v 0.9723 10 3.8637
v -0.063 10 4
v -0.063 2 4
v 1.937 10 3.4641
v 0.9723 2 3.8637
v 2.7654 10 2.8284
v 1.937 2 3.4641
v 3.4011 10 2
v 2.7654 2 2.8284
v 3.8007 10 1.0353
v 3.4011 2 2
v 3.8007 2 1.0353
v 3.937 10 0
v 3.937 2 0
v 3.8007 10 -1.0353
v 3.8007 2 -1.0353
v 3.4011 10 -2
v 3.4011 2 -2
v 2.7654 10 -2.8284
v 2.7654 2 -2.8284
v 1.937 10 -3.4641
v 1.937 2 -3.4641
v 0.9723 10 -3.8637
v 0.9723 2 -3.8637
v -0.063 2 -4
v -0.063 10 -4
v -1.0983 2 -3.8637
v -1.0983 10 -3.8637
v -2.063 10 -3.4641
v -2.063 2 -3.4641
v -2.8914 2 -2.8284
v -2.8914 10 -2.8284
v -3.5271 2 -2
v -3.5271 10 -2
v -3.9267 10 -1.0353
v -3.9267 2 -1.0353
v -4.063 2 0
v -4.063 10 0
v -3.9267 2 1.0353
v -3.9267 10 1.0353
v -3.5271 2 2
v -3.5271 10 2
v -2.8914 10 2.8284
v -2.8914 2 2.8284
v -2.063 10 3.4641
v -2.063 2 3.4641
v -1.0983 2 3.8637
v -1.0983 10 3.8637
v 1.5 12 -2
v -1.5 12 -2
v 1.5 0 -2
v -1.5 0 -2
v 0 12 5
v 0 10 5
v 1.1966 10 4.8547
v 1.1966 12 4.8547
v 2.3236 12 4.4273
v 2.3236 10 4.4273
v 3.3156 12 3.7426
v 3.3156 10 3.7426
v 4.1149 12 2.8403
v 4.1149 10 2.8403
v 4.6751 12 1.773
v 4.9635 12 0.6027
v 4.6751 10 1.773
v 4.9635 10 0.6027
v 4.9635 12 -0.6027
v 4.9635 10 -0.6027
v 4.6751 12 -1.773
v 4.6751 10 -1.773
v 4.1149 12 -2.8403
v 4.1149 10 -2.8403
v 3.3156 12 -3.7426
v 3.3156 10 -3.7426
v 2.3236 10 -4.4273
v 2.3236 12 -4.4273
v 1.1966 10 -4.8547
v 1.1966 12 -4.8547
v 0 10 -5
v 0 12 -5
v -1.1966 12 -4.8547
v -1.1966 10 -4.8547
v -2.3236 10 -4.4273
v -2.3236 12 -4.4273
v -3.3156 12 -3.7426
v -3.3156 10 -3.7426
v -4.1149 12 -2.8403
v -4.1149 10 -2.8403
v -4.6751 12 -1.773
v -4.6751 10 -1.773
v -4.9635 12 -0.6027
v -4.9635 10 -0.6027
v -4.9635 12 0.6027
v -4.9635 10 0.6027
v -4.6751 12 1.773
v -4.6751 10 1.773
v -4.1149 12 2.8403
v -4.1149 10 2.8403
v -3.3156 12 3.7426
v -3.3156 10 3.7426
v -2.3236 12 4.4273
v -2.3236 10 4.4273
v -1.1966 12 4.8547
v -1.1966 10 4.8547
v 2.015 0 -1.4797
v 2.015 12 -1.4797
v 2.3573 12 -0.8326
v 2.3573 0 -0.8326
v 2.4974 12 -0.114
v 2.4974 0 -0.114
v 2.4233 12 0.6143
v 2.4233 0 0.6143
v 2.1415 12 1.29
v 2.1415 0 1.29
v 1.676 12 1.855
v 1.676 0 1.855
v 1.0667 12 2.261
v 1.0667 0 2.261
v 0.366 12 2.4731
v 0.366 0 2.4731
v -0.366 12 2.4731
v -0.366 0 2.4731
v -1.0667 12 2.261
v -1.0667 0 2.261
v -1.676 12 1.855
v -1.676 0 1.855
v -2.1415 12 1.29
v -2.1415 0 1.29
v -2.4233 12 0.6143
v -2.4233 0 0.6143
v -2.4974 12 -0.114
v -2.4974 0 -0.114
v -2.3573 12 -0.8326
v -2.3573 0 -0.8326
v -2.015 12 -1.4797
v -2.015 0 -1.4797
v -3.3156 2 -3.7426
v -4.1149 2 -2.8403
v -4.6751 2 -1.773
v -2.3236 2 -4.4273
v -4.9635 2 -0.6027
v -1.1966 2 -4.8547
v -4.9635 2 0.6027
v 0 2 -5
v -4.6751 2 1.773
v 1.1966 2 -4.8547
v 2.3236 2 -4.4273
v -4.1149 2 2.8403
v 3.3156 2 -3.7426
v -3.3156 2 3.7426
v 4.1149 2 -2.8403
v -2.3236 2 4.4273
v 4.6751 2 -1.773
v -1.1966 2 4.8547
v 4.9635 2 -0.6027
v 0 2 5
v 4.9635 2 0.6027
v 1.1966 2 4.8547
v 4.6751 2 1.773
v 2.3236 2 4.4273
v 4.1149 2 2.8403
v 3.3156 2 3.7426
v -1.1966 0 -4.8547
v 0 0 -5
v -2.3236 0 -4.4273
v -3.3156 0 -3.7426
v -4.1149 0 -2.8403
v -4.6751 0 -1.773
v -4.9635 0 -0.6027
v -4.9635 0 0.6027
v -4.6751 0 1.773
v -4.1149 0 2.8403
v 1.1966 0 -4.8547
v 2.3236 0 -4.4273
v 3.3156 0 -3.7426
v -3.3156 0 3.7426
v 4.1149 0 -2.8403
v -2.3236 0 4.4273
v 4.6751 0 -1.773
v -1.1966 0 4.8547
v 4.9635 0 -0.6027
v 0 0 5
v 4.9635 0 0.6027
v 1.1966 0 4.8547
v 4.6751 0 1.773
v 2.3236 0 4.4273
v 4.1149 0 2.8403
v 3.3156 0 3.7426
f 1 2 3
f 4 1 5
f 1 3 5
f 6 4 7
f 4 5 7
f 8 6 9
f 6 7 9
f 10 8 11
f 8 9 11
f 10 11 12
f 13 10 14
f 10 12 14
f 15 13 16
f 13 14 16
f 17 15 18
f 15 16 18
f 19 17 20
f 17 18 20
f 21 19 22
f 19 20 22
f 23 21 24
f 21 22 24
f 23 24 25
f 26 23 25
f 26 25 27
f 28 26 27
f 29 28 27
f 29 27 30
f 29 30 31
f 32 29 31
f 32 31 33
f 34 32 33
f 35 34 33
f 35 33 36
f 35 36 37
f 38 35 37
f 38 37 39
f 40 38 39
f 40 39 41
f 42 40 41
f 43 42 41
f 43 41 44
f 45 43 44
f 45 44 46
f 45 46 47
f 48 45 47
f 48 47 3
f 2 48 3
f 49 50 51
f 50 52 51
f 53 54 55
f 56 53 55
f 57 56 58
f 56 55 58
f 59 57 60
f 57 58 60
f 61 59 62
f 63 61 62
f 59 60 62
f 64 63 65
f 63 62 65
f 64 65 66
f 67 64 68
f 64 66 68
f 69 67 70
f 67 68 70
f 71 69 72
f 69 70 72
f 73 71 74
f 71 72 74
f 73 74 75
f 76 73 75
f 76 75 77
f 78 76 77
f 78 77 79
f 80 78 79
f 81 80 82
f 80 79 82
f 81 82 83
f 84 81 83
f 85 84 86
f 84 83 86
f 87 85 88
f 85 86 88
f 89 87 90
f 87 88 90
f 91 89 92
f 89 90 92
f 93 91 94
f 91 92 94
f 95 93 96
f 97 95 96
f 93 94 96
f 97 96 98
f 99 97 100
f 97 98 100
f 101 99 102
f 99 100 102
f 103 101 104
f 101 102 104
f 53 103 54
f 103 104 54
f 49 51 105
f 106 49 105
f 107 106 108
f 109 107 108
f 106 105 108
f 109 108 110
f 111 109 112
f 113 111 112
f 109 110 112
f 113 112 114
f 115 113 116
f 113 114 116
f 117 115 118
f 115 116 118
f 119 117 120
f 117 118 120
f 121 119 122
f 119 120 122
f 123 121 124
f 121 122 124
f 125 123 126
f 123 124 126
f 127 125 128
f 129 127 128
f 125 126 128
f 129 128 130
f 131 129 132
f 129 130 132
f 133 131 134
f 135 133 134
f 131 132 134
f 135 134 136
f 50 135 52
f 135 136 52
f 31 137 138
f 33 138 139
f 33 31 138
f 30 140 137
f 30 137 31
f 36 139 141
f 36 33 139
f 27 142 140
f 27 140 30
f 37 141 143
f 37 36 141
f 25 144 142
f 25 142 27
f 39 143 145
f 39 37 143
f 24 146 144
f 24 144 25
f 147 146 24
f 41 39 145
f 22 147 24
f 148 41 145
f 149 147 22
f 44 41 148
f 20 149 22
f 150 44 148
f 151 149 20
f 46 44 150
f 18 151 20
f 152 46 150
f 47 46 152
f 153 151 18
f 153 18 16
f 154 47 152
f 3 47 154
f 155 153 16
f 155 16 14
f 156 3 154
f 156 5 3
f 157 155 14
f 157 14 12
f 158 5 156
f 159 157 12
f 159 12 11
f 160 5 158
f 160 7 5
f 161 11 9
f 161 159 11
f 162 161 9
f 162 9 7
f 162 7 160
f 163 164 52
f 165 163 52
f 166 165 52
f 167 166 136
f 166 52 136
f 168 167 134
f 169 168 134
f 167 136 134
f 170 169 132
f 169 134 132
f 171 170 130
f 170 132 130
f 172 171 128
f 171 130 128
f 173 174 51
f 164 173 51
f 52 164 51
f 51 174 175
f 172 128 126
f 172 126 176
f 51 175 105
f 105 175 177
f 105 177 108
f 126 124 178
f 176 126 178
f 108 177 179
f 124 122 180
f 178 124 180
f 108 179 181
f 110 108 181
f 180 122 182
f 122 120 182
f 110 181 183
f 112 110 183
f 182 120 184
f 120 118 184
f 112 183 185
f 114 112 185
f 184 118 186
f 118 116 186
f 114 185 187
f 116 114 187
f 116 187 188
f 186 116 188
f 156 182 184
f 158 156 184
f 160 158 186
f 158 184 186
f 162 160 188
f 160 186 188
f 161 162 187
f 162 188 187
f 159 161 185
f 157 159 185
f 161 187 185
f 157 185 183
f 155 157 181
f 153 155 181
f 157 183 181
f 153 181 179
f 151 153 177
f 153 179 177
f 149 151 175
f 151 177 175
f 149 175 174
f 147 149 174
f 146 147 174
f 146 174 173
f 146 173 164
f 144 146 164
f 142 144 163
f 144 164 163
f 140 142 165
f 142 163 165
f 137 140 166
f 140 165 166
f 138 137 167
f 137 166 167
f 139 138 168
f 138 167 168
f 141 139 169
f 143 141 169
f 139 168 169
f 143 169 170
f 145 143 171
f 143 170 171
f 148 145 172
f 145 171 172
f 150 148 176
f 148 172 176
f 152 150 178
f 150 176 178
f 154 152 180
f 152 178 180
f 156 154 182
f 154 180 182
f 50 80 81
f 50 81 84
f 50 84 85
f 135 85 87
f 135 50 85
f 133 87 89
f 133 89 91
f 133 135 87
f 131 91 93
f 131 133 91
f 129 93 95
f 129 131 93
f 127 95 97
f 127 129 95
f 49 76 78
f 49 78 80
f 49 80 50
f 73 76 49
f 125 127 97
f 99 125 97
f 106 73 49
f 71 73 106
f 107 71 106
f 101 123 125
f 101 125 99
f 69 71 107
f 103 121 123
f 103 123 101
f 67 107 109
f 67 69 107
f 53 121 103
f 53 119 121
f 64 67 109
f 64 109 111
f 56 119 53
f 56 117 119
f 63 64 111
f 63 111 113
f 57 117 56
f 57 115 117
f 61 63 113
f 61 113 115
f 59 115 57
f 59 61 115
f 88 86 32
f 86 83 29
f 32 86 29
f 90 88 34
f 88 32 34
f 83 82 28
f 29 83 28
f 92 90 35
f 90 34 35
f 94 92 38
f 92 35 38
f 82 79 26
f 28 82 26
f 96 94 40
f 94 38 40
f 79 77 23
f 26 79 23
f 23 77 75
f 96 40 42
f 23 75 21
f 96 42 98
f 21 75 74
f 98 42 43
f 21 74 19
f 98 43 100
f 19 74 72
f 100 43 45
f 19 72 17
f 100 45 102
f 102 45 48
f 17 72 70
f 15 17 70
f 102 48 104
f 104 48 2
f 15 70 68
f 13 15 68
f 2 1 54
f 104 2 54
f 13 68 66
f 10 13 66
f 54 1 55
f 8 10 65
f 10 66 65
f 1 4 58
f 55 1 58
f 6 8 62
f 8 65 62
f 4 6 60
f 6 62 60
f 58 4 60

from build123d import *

# Parameters (mm, degrees)
SKETCH_1_R      = 4
EXTRUDE_1_DEPTH = 10
SKETCH_2_R      = 5
EXTRUDE_3_DEPTH = 2
SKETCH_4_R      = 5
EXTRUDE_4_DEPTH = 2


with BuildPart() as part:
    # 草图1 → 凸台-拉伸1 (new body)
    with BuildSketch(Plane(origin=(0, 0, 0), x_dir=(1, 0, 0), z_dir=(0, 1, 0))):
        with Locations(Location((-0.063005912, 0, 0), (0, 0, 270))):
            Circle(SKETCH_1_R)
        with BuildLine():
            Line((-1.5, 2), (1.5, 2))
            ThreePointArc((1.5, 2), (0, -2.5), (-1.5, 2))
        make_face(mode=Mode.SUBTRACT)
    extrude(amount=EXTRUDE_1_DEPTH)

    # 草图2 → 凸台-拉伸3 (add)
    with BuildSketch(Plane(origin=(0, 0, 0), x_dir=(1, 0, 0), z_dir=(0, 1, 0))):
        with Locations(Location((0, 0, 0), (0, 0, 270))):
            Circle(SKETCH_2_R)
        with BuildLine():
            Line((-1.5, 2), (1.5, 2))
            ThreePointArc((1.5, 2), (0, -2.5), (-1.5, 2))
        make_face(mode=Mode.SUBTRACT)
    extrude(amount=EXTRUDE_3_DEPTH)

    # 草图4 → 凸台-拉伸4 (add)
    with BuildSketch(Plane(origin=(0, 10, 0), x_dir=(1, 0, 0), z_dir=(0, 1, 0))):
        with Locations(Location((0, 0, 0), (0, 0, 270))):
            Circle(SKETCH_4_R)
        with BuildLine():
            Line((-1.5, 2), (1.5, 2))
            ThreePointArc((1.5, 2), (0, -2.5), (-1.5, 2))
        make_face(mode=Mode.SUBTRACT)
    extrude(amount=EXTRUDE_4_DEPTH)


solid = part.part
